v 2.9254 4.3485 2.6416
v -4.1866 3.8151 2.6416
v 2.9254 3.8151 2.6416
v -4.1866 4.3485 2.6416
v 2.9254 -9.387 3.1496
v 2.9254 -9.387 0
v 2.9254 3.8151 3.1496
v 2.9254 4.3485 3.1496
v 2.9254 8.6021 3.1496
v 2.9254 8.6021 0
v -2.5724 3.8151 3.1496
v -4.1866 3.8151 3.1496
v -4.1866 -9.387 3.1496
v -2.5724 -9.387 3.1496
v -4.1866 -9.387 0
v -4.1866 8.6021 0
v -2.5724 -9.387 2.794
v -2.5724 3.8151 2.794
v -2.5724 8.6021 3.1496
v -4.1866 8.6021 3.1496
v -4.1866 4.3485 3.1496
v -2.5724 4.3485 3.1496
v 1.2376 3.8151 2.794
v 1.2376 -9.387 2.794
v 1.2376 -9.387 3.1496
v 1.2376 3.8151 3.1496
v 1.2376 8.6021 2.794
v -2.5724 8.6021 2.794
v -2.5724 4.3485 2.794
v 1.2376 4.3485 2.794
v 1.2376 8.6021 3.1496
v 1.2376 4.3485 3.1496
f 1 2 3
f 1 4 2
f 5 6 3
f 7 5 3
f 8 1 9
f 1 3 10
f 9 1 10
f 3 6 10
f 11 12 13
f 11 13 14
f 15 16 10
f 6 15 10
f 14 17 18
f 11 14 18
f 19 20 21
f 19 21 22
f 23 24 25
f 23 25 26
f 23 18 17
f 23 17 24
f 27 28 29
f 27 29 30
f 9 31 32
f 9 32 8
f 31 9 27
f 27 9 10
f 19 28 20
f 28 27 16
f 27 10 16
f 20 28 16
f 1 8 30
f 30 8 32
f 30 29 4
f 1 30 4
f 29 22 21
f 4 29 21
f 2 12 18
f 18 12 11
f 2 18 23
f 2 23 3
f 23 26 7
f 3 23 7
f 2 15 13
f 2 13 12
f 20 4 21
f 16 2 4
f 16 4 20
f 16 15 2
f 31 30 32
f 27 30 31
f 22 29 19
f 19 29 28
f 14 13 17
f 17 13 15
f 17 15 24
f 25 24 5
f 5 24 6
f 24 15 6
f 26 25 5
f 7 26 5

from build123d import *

# Parameters (mm, degrees)
F0_W     = 1.6141478449
F0_H     = 17.9891760959
F0_W_2   = 3.81
F0_W_3   = 1.6878521551
F1_DEPTH = 3.1496
F2_START = 2.794
F2_DEPTH = 2.0828
F3_W     = 8.6175605327
F3_H     = 0.5334
F3_W_2   = 1.6141478449
F4_DEPTH = 0.508


with BuildPart() as f1:
    # F0 (on Top) → F1 (new body)
    with BuildSketch(Plane.XY):
        with Locations((-3.3795093424, -0.3924611956)):
            Rectangle(F0_W, F0_H)
        with Locations((-0.66743542, -0.3924611956)):
            Rectangle(F0_W_2, F0_H)
        with Locations((2.0814906576, -0.3924611956)):
            Rectangle(F0_W_3, F0_H)
    extrude(amount=F1_DEPTH)

    # F0 (on Top) → F2 (cut)
    with BuildSketch(Plane.XY.offset(F2_START)):
        with Locations((-0.66743542, -0.3924611956)):
            Rectangle(F0_W_2, F0_H)
    extrude(amount=F2_DEPTH, mode=Mode.SUBTRACT)

    # F3 (on face) → F4 (cut)
    with BuildSketch(Plane.XY.offset(3.1496)):
        with Locations((1.7363448463, 4.0817503403)):
            Rectangle(F3_W, F3_H)
        with Locations((-3.3795093424, 4.0817503403)):
            Rectangle(F3_W_2, F3_H)
    extrude(amount=-F4_DEPTH, mode=Mode.SUBTRACT)


solid = f1.part
